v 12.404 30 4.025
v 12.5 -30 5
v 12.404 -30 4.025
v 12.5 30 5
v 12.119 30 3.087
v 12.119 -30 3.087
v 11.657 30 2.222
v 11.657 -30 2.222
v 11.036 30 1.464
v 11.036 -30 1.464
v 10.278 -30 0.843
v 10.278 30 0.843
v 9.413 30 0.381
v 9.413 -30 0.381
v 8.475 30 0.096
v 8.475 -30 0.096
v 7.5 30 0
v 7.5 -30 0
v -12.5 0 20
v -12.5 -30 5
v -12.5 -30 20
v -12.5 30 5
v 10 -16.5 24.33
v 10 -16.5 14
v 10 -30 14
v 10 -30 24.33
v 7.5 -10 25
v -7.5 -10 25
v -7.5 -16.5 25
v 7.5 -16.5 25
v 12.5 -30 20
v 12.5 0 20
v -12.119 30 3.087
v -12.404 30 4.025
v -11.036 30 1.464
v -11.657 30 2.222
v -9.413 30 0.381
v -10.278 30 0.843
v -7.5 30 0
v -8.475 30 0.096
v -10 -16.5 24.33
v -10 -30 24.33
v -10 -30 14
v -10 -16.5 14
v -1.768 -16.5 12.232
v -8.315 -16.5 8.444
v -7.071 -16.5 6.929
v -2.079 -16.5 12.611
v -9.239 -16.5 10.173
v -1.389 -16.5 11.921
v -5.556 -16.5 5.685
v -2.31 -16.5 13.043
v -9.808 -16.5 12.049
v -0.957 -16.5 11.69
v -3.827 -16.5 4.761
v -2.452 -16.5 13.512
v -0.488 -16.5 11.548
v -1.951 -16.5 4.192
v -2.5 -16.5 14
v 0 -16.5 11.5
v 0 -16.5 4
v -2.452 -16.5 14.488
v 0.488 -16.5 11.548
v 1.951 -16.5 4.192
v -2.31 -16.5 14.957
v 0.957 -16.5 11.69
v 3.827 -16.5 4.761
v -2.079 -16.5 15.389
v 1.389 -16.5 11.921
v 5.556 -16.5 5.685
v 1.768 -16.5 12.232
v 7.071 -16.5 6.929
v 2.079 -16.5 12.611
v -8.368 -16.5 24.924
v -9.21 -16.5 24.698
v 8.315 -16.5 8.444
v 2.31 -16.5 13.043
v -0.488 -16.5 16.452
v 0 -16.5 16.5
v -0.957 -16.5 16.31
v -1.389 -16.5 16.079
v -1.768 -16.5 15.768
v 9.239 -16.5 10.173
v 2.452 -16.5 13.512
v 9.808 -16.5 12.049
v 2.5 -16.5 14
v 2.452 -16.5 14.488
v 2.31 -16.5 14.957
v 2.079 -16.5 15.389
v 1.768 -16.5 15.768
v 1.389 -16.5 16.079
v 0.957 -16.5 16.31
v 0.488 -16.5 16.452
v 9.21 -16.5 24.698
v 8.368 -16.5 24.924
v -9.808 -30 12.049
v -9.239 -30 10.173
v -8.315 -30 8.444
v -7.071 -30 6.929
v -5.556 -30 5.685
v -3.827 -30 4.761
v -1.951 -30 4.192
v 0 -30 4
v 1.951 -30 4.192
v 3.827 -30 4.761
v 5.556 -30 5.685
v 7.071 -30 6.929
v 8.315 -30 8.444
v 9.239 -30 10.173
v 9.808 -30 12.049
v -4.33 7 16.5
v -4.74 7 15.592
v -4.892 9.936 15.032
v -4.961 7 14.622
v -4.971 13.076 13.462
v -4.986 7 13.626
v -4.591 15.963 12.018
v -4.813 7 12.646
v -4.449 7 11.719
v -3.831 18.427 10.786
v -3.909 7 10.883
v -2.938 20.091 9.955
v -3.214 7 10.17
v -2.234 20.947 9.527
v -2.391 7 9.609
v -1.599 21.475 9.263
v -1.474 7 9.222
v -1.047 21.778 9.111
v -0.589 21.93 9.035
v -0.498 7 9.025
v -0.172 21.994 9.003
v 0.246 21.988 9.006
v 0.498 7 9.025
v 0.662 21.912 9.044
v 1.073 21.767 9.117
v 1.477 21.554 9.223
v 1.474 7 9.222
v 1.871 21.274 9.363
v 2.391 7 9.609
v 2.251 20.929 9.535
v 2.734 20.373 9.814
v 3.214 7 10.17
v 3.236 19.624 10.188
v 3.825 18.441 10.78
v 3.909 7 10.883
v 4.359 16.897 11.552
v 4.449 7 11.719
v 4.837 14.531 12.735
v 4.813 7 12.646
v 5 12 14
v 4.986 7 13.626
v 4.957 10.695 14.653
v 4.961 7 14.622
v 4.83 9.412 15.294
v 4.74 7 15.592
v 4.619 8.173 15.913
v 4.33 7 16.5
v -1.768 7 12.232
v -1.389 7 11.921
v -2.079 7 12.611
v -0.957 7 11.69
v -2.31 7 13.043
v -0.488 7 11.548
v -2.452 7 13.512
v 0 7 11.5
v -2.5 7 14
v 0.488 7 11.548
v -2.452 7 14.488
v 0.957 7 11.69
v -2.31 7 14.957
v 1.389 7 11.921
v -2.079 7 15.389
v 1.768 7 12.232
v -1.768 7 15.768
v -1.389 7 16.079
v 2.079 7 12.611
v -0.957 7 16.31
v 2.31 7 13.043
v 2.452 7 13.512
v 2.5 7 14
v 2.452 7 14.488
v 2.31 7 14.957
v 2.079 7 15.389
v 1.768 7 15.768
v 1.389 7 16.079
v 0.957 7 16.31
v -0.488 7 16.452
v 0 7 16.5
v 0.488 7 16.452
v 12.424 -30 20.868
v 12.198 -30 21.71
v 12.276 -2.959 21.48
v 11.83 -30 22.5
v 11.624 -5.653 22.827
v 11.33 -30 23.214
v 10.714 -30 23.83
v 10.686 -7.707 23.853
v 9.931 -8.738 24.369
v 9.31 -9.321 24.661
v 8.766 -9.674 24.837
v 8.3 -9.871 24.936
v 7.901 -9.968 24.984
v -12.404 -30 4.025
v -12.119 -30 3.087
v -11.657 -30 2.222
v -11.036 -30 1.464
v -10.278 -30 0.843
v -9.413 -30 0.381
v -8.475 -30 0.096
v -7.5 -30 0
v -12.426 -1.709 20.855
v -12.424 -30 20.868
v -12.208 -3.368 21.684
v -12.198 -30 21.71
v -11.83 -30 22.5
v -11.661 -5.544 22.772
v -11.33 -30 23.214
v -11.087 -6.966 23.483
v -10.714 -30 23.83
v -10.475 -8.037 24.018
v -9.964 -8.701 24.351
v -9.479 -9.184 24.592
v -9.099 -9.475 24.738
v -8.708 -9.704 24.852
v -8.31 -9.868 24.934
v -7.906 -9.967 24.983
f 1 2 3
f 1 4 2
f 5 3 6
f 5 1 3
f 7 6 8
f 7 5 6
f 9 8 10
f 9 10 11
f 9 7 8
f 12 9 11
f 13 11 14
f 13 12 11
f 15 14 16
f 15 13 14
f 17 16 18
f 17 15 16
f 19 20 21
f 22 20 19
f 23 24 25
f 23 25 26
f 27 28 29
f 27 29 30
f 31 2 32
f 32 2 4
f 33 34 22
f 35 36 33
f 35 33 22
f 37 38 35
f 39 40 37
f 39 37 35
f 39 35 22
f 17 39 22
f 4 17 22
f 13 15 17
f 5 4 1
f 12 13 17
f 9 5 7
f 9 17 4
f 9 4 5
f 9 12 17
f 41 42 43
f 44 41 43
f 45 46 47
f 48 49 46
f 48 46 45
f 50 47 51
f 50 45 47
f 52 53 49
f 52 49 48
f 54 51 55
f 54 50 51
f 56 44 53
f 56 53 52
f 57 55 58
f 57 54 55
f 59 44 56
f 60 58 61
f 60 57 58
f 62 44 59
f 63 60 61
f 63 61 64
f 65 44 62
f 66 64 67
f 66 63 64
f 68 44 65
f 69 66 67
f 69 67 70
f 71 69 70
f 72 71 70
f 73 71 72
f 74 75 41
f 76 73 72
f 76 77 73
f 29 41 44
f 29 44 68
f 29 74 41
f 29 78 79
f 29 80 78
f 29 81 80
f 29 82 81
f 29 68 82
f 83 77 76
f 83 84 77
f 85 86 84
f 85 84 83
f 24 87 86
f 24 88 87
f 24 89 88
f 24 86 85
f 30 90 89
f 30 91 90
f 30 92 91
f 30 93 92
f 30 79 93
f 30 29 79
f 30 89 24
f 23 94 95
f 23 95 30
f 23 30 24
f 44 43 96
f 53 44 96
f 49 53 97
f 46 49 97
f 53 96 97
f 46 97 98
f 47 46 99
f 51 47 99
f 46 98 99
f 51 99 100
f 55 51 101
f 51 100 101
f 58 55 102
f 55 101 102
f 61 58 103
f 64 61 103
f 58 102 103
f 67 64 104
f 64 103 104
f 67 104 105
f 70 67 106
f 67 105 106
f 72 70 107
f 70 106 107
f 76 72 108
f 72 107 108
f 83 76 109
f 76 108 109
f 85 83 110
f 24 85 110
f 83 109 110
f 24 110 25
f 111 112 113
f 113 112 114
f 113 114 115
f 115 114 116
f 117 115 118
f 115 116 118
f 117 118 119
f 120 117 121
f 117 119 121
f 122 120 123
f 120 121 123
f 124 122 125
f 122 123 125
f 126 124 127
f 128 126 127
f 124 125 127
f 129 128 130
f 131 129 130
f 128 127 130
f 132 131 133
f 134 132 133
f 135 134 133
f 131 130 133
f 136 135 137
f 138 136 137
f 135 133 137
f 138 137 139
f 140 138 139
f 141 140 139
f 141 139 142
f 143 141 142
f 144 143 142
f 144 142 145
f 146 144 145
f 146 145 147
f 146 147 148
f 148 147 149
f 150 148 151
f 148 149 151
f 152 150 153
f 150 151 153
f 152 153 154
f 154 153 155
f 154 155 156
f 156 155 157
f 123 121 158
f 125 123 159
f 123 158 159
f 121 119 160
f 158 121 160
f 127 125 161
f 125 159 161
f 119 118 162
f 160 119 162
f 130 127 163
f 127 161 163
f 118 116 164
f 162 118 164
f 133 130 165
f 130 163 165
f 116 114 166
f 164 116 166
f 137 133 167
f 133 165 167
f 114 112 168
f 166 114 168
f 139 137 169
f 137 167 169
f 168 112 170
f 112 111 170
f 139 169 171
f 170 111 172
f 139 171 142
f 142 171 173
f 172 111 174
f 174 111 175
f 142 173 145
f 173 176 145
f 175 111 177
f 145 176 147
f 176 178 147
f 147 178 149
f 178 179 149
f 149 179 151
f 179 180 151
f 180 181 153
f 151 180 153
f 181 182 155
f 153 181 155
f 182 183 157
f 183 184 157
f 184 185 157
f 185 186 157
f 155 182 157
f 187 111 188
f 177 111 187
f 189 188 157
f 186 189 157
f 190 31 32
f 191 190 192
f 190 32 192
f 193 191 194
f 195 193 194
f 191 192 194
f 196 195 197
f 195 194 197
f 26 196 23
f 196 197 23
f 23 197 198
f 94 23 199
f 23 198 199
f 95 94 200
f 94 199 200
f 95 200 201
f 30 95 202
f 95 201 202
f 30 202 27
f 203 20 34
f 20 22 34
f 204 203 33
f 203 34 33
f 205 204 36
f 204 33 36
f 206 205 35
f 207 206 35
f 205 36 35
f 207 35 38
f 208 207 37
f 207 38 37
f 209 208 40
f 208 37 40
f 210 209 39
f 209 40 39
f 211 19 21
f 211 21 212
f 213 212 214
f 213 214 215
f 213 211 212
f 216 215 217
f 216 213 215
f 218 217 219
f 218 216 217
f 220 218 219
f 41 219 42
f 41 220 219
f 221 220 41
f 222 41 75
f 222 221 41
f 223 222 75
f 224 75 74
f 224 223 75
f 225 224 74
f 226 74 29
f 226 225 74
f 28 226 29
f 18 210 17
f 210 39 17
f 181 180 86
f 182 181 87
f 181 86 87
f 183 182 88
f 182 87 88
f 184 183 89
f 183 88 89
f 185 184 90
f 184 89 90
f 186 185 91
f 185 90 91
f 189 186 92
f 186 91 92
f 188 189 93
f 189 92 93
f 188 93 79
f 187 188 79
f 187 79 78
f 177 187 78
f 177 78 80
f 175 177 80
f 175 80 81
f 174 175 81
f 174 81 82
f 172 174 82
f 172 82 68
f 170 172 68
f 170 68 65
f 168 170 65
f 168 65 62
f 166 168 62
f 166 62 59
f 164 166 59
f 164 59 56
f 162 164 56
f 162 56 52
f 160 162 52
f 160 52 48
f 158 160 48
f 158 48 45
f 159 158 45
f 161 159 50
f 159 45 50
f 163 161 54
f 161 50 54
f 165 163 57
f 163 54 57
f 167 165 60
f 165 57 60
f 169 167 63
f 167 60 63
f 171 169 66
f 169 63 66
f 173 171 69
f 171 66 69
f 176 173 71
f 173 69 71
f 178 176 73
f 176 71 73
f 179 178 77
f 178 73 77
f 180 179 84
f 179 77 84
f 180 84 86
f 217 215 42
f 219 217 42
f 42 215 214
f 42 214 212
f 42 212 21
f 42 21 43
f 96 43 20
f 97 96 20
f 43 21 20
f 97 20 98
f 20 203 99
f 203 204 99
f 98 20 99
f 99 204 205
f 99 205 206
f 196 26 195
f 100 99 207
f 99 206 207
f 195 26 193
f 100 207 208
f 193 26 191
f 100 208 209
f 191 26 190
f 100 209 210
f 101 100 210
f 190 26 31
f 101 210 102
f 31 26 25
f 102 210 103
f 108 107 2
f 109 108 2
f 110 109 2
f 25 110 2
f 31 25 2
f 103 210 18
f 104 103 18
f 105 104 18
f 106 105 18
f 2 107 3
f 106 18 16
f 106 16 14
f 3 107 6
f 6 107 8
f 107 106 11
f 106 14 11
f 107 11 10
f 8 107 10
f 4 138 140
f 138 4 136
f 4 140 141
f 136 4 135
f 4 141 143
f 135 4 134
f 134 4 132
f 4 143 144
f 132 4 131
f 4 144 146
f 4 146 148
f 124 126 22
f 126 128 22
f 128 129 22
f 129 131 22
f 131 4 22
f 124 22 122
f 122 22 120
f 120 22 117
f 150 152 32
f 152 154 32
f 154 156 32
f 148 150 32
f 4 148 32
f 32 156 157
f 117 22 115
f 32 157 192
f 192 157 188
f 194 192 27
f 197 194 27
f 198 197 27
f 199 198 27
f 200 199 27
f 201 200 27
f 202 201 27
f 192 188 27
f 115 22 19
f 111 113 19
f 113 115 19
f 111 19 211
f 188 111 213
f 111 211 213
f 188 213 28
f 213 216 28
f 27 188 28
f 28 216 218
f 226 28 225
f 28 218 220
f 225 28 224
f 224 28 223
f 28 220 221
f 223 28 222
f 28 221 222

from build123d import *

# Parameters (mm, degrees)
F0_W        = 25
F0_H        = 60
F1_DEPTH    = 25
F2_R        = 5
F4_DEPTH    = 13.5
F5_DEPTH    = 13.5
F6_T1_DEPTH = 222.1863099029
F7_R        = 2.5
F8_DEPTH    = 55
F10_START   = -23.5
F9_R        = 5
F10_DEPTH   = 23


# Not quite as in the source:
# - a fillet or chamfer that OpenCascade refuses, or shapes differently, is made with other operations: its cross-section is extruded or revolved along the edge and cut away or added
# - ends of sketch curves that miss each other by under 0.0002 mm in the source are joined


with BuildPart() as f1:
    # F0 (on Top) → F1 (new body)
    with BuildSketch(Plane.XY):
        Rectangle(F0_W, F0_H)
    extrude(amount=F1_DEPTH)

    # F2
    f2_edges = [f1.edges().sort_by_distance(p)[0] for p in [
        (12.5, 0, 25),
        (12.5, 0, 0),
        (-12.5, 0, 0),
        (-12.5, 0, 25),
    ]]
    fillet(f2_edges, radius=F2_R)

    # F3 (on face) → F4 (cut)
    with BuildSketch(Plane.XZ.offset(30)):
        with BuildLine():
            Line((-10, 13.9999993678), (10, 13.9999993678))
            ThreePointArc((10, 13.9999993678), (-3.161e-07, 24), (-10, 13.9999993678))
        make_face()
        with BuildLine():
            ThreePointArc((-10, 13.9999993678), (3.161e-07, 4), (10, 14))
            Line((10, 14), (-10, 13.9999993678))
        make_face()
    extrude(amount=-F4_DEPTH, mode=Mode.SUBTRACT)

    # F3 (on face) → F5 (cut)
    with BuildSketch(Plane.XZ.offset(30)):
        with BuildLine():
            ThreePointArc((-10, 13.9999993678), (-3.161e-07, 24), (10, 14))
            Line((10, 14), (10, 24.3301270189))
            ThreePointArc((10, 24.3301270189), (8.7940952255, 24.8296291314), (7.5, 25))
            Line((7.5, 25), (-7.5, 25))
            ThreePointArc((-7.5, 25), (-8.7940952255, 24.8296291314), (-10, 24.3301270189))
            Line((-10, 24.3301270189), (-10, 13.9999993678))
        make_face()
    extrude(amount=-F5_DEPTH, mode=Mode.SUBTRACT)

    # F6: chamfer of 40 x 20 on 1 edges, made by hand

    # F6_s2 → F6_t1 (cut)
    with BuildSketch(Plane.YZ.offset(-111.0931549515)):
        Polygon((30, 5), (-10, 25), (30, 25), align=None)
    extrude(amount=F6_T1_DEPTH, mode=Mode.SUBTRACT)

    # F7 (on face) → F8 (cut)
    with BuildSketch(Plane.XZ.offset(16.5)):
        with Locations((0, 14)):
            Circle(F7_R)
    extrude(amount=-F8_DEPTH, mode=Mode.SUBTRACT)

    # F9 (on face) → F10 (cut)
    with BuildSketch(Plane.XZ.offset(16.5).offset(F10_START)):
        with Locations((0, 14)):
            Circle(F9_R)
    extrude(amount=-F10_DEPTH, mode=Mode.SUBTRACT)


solid = f1.part
